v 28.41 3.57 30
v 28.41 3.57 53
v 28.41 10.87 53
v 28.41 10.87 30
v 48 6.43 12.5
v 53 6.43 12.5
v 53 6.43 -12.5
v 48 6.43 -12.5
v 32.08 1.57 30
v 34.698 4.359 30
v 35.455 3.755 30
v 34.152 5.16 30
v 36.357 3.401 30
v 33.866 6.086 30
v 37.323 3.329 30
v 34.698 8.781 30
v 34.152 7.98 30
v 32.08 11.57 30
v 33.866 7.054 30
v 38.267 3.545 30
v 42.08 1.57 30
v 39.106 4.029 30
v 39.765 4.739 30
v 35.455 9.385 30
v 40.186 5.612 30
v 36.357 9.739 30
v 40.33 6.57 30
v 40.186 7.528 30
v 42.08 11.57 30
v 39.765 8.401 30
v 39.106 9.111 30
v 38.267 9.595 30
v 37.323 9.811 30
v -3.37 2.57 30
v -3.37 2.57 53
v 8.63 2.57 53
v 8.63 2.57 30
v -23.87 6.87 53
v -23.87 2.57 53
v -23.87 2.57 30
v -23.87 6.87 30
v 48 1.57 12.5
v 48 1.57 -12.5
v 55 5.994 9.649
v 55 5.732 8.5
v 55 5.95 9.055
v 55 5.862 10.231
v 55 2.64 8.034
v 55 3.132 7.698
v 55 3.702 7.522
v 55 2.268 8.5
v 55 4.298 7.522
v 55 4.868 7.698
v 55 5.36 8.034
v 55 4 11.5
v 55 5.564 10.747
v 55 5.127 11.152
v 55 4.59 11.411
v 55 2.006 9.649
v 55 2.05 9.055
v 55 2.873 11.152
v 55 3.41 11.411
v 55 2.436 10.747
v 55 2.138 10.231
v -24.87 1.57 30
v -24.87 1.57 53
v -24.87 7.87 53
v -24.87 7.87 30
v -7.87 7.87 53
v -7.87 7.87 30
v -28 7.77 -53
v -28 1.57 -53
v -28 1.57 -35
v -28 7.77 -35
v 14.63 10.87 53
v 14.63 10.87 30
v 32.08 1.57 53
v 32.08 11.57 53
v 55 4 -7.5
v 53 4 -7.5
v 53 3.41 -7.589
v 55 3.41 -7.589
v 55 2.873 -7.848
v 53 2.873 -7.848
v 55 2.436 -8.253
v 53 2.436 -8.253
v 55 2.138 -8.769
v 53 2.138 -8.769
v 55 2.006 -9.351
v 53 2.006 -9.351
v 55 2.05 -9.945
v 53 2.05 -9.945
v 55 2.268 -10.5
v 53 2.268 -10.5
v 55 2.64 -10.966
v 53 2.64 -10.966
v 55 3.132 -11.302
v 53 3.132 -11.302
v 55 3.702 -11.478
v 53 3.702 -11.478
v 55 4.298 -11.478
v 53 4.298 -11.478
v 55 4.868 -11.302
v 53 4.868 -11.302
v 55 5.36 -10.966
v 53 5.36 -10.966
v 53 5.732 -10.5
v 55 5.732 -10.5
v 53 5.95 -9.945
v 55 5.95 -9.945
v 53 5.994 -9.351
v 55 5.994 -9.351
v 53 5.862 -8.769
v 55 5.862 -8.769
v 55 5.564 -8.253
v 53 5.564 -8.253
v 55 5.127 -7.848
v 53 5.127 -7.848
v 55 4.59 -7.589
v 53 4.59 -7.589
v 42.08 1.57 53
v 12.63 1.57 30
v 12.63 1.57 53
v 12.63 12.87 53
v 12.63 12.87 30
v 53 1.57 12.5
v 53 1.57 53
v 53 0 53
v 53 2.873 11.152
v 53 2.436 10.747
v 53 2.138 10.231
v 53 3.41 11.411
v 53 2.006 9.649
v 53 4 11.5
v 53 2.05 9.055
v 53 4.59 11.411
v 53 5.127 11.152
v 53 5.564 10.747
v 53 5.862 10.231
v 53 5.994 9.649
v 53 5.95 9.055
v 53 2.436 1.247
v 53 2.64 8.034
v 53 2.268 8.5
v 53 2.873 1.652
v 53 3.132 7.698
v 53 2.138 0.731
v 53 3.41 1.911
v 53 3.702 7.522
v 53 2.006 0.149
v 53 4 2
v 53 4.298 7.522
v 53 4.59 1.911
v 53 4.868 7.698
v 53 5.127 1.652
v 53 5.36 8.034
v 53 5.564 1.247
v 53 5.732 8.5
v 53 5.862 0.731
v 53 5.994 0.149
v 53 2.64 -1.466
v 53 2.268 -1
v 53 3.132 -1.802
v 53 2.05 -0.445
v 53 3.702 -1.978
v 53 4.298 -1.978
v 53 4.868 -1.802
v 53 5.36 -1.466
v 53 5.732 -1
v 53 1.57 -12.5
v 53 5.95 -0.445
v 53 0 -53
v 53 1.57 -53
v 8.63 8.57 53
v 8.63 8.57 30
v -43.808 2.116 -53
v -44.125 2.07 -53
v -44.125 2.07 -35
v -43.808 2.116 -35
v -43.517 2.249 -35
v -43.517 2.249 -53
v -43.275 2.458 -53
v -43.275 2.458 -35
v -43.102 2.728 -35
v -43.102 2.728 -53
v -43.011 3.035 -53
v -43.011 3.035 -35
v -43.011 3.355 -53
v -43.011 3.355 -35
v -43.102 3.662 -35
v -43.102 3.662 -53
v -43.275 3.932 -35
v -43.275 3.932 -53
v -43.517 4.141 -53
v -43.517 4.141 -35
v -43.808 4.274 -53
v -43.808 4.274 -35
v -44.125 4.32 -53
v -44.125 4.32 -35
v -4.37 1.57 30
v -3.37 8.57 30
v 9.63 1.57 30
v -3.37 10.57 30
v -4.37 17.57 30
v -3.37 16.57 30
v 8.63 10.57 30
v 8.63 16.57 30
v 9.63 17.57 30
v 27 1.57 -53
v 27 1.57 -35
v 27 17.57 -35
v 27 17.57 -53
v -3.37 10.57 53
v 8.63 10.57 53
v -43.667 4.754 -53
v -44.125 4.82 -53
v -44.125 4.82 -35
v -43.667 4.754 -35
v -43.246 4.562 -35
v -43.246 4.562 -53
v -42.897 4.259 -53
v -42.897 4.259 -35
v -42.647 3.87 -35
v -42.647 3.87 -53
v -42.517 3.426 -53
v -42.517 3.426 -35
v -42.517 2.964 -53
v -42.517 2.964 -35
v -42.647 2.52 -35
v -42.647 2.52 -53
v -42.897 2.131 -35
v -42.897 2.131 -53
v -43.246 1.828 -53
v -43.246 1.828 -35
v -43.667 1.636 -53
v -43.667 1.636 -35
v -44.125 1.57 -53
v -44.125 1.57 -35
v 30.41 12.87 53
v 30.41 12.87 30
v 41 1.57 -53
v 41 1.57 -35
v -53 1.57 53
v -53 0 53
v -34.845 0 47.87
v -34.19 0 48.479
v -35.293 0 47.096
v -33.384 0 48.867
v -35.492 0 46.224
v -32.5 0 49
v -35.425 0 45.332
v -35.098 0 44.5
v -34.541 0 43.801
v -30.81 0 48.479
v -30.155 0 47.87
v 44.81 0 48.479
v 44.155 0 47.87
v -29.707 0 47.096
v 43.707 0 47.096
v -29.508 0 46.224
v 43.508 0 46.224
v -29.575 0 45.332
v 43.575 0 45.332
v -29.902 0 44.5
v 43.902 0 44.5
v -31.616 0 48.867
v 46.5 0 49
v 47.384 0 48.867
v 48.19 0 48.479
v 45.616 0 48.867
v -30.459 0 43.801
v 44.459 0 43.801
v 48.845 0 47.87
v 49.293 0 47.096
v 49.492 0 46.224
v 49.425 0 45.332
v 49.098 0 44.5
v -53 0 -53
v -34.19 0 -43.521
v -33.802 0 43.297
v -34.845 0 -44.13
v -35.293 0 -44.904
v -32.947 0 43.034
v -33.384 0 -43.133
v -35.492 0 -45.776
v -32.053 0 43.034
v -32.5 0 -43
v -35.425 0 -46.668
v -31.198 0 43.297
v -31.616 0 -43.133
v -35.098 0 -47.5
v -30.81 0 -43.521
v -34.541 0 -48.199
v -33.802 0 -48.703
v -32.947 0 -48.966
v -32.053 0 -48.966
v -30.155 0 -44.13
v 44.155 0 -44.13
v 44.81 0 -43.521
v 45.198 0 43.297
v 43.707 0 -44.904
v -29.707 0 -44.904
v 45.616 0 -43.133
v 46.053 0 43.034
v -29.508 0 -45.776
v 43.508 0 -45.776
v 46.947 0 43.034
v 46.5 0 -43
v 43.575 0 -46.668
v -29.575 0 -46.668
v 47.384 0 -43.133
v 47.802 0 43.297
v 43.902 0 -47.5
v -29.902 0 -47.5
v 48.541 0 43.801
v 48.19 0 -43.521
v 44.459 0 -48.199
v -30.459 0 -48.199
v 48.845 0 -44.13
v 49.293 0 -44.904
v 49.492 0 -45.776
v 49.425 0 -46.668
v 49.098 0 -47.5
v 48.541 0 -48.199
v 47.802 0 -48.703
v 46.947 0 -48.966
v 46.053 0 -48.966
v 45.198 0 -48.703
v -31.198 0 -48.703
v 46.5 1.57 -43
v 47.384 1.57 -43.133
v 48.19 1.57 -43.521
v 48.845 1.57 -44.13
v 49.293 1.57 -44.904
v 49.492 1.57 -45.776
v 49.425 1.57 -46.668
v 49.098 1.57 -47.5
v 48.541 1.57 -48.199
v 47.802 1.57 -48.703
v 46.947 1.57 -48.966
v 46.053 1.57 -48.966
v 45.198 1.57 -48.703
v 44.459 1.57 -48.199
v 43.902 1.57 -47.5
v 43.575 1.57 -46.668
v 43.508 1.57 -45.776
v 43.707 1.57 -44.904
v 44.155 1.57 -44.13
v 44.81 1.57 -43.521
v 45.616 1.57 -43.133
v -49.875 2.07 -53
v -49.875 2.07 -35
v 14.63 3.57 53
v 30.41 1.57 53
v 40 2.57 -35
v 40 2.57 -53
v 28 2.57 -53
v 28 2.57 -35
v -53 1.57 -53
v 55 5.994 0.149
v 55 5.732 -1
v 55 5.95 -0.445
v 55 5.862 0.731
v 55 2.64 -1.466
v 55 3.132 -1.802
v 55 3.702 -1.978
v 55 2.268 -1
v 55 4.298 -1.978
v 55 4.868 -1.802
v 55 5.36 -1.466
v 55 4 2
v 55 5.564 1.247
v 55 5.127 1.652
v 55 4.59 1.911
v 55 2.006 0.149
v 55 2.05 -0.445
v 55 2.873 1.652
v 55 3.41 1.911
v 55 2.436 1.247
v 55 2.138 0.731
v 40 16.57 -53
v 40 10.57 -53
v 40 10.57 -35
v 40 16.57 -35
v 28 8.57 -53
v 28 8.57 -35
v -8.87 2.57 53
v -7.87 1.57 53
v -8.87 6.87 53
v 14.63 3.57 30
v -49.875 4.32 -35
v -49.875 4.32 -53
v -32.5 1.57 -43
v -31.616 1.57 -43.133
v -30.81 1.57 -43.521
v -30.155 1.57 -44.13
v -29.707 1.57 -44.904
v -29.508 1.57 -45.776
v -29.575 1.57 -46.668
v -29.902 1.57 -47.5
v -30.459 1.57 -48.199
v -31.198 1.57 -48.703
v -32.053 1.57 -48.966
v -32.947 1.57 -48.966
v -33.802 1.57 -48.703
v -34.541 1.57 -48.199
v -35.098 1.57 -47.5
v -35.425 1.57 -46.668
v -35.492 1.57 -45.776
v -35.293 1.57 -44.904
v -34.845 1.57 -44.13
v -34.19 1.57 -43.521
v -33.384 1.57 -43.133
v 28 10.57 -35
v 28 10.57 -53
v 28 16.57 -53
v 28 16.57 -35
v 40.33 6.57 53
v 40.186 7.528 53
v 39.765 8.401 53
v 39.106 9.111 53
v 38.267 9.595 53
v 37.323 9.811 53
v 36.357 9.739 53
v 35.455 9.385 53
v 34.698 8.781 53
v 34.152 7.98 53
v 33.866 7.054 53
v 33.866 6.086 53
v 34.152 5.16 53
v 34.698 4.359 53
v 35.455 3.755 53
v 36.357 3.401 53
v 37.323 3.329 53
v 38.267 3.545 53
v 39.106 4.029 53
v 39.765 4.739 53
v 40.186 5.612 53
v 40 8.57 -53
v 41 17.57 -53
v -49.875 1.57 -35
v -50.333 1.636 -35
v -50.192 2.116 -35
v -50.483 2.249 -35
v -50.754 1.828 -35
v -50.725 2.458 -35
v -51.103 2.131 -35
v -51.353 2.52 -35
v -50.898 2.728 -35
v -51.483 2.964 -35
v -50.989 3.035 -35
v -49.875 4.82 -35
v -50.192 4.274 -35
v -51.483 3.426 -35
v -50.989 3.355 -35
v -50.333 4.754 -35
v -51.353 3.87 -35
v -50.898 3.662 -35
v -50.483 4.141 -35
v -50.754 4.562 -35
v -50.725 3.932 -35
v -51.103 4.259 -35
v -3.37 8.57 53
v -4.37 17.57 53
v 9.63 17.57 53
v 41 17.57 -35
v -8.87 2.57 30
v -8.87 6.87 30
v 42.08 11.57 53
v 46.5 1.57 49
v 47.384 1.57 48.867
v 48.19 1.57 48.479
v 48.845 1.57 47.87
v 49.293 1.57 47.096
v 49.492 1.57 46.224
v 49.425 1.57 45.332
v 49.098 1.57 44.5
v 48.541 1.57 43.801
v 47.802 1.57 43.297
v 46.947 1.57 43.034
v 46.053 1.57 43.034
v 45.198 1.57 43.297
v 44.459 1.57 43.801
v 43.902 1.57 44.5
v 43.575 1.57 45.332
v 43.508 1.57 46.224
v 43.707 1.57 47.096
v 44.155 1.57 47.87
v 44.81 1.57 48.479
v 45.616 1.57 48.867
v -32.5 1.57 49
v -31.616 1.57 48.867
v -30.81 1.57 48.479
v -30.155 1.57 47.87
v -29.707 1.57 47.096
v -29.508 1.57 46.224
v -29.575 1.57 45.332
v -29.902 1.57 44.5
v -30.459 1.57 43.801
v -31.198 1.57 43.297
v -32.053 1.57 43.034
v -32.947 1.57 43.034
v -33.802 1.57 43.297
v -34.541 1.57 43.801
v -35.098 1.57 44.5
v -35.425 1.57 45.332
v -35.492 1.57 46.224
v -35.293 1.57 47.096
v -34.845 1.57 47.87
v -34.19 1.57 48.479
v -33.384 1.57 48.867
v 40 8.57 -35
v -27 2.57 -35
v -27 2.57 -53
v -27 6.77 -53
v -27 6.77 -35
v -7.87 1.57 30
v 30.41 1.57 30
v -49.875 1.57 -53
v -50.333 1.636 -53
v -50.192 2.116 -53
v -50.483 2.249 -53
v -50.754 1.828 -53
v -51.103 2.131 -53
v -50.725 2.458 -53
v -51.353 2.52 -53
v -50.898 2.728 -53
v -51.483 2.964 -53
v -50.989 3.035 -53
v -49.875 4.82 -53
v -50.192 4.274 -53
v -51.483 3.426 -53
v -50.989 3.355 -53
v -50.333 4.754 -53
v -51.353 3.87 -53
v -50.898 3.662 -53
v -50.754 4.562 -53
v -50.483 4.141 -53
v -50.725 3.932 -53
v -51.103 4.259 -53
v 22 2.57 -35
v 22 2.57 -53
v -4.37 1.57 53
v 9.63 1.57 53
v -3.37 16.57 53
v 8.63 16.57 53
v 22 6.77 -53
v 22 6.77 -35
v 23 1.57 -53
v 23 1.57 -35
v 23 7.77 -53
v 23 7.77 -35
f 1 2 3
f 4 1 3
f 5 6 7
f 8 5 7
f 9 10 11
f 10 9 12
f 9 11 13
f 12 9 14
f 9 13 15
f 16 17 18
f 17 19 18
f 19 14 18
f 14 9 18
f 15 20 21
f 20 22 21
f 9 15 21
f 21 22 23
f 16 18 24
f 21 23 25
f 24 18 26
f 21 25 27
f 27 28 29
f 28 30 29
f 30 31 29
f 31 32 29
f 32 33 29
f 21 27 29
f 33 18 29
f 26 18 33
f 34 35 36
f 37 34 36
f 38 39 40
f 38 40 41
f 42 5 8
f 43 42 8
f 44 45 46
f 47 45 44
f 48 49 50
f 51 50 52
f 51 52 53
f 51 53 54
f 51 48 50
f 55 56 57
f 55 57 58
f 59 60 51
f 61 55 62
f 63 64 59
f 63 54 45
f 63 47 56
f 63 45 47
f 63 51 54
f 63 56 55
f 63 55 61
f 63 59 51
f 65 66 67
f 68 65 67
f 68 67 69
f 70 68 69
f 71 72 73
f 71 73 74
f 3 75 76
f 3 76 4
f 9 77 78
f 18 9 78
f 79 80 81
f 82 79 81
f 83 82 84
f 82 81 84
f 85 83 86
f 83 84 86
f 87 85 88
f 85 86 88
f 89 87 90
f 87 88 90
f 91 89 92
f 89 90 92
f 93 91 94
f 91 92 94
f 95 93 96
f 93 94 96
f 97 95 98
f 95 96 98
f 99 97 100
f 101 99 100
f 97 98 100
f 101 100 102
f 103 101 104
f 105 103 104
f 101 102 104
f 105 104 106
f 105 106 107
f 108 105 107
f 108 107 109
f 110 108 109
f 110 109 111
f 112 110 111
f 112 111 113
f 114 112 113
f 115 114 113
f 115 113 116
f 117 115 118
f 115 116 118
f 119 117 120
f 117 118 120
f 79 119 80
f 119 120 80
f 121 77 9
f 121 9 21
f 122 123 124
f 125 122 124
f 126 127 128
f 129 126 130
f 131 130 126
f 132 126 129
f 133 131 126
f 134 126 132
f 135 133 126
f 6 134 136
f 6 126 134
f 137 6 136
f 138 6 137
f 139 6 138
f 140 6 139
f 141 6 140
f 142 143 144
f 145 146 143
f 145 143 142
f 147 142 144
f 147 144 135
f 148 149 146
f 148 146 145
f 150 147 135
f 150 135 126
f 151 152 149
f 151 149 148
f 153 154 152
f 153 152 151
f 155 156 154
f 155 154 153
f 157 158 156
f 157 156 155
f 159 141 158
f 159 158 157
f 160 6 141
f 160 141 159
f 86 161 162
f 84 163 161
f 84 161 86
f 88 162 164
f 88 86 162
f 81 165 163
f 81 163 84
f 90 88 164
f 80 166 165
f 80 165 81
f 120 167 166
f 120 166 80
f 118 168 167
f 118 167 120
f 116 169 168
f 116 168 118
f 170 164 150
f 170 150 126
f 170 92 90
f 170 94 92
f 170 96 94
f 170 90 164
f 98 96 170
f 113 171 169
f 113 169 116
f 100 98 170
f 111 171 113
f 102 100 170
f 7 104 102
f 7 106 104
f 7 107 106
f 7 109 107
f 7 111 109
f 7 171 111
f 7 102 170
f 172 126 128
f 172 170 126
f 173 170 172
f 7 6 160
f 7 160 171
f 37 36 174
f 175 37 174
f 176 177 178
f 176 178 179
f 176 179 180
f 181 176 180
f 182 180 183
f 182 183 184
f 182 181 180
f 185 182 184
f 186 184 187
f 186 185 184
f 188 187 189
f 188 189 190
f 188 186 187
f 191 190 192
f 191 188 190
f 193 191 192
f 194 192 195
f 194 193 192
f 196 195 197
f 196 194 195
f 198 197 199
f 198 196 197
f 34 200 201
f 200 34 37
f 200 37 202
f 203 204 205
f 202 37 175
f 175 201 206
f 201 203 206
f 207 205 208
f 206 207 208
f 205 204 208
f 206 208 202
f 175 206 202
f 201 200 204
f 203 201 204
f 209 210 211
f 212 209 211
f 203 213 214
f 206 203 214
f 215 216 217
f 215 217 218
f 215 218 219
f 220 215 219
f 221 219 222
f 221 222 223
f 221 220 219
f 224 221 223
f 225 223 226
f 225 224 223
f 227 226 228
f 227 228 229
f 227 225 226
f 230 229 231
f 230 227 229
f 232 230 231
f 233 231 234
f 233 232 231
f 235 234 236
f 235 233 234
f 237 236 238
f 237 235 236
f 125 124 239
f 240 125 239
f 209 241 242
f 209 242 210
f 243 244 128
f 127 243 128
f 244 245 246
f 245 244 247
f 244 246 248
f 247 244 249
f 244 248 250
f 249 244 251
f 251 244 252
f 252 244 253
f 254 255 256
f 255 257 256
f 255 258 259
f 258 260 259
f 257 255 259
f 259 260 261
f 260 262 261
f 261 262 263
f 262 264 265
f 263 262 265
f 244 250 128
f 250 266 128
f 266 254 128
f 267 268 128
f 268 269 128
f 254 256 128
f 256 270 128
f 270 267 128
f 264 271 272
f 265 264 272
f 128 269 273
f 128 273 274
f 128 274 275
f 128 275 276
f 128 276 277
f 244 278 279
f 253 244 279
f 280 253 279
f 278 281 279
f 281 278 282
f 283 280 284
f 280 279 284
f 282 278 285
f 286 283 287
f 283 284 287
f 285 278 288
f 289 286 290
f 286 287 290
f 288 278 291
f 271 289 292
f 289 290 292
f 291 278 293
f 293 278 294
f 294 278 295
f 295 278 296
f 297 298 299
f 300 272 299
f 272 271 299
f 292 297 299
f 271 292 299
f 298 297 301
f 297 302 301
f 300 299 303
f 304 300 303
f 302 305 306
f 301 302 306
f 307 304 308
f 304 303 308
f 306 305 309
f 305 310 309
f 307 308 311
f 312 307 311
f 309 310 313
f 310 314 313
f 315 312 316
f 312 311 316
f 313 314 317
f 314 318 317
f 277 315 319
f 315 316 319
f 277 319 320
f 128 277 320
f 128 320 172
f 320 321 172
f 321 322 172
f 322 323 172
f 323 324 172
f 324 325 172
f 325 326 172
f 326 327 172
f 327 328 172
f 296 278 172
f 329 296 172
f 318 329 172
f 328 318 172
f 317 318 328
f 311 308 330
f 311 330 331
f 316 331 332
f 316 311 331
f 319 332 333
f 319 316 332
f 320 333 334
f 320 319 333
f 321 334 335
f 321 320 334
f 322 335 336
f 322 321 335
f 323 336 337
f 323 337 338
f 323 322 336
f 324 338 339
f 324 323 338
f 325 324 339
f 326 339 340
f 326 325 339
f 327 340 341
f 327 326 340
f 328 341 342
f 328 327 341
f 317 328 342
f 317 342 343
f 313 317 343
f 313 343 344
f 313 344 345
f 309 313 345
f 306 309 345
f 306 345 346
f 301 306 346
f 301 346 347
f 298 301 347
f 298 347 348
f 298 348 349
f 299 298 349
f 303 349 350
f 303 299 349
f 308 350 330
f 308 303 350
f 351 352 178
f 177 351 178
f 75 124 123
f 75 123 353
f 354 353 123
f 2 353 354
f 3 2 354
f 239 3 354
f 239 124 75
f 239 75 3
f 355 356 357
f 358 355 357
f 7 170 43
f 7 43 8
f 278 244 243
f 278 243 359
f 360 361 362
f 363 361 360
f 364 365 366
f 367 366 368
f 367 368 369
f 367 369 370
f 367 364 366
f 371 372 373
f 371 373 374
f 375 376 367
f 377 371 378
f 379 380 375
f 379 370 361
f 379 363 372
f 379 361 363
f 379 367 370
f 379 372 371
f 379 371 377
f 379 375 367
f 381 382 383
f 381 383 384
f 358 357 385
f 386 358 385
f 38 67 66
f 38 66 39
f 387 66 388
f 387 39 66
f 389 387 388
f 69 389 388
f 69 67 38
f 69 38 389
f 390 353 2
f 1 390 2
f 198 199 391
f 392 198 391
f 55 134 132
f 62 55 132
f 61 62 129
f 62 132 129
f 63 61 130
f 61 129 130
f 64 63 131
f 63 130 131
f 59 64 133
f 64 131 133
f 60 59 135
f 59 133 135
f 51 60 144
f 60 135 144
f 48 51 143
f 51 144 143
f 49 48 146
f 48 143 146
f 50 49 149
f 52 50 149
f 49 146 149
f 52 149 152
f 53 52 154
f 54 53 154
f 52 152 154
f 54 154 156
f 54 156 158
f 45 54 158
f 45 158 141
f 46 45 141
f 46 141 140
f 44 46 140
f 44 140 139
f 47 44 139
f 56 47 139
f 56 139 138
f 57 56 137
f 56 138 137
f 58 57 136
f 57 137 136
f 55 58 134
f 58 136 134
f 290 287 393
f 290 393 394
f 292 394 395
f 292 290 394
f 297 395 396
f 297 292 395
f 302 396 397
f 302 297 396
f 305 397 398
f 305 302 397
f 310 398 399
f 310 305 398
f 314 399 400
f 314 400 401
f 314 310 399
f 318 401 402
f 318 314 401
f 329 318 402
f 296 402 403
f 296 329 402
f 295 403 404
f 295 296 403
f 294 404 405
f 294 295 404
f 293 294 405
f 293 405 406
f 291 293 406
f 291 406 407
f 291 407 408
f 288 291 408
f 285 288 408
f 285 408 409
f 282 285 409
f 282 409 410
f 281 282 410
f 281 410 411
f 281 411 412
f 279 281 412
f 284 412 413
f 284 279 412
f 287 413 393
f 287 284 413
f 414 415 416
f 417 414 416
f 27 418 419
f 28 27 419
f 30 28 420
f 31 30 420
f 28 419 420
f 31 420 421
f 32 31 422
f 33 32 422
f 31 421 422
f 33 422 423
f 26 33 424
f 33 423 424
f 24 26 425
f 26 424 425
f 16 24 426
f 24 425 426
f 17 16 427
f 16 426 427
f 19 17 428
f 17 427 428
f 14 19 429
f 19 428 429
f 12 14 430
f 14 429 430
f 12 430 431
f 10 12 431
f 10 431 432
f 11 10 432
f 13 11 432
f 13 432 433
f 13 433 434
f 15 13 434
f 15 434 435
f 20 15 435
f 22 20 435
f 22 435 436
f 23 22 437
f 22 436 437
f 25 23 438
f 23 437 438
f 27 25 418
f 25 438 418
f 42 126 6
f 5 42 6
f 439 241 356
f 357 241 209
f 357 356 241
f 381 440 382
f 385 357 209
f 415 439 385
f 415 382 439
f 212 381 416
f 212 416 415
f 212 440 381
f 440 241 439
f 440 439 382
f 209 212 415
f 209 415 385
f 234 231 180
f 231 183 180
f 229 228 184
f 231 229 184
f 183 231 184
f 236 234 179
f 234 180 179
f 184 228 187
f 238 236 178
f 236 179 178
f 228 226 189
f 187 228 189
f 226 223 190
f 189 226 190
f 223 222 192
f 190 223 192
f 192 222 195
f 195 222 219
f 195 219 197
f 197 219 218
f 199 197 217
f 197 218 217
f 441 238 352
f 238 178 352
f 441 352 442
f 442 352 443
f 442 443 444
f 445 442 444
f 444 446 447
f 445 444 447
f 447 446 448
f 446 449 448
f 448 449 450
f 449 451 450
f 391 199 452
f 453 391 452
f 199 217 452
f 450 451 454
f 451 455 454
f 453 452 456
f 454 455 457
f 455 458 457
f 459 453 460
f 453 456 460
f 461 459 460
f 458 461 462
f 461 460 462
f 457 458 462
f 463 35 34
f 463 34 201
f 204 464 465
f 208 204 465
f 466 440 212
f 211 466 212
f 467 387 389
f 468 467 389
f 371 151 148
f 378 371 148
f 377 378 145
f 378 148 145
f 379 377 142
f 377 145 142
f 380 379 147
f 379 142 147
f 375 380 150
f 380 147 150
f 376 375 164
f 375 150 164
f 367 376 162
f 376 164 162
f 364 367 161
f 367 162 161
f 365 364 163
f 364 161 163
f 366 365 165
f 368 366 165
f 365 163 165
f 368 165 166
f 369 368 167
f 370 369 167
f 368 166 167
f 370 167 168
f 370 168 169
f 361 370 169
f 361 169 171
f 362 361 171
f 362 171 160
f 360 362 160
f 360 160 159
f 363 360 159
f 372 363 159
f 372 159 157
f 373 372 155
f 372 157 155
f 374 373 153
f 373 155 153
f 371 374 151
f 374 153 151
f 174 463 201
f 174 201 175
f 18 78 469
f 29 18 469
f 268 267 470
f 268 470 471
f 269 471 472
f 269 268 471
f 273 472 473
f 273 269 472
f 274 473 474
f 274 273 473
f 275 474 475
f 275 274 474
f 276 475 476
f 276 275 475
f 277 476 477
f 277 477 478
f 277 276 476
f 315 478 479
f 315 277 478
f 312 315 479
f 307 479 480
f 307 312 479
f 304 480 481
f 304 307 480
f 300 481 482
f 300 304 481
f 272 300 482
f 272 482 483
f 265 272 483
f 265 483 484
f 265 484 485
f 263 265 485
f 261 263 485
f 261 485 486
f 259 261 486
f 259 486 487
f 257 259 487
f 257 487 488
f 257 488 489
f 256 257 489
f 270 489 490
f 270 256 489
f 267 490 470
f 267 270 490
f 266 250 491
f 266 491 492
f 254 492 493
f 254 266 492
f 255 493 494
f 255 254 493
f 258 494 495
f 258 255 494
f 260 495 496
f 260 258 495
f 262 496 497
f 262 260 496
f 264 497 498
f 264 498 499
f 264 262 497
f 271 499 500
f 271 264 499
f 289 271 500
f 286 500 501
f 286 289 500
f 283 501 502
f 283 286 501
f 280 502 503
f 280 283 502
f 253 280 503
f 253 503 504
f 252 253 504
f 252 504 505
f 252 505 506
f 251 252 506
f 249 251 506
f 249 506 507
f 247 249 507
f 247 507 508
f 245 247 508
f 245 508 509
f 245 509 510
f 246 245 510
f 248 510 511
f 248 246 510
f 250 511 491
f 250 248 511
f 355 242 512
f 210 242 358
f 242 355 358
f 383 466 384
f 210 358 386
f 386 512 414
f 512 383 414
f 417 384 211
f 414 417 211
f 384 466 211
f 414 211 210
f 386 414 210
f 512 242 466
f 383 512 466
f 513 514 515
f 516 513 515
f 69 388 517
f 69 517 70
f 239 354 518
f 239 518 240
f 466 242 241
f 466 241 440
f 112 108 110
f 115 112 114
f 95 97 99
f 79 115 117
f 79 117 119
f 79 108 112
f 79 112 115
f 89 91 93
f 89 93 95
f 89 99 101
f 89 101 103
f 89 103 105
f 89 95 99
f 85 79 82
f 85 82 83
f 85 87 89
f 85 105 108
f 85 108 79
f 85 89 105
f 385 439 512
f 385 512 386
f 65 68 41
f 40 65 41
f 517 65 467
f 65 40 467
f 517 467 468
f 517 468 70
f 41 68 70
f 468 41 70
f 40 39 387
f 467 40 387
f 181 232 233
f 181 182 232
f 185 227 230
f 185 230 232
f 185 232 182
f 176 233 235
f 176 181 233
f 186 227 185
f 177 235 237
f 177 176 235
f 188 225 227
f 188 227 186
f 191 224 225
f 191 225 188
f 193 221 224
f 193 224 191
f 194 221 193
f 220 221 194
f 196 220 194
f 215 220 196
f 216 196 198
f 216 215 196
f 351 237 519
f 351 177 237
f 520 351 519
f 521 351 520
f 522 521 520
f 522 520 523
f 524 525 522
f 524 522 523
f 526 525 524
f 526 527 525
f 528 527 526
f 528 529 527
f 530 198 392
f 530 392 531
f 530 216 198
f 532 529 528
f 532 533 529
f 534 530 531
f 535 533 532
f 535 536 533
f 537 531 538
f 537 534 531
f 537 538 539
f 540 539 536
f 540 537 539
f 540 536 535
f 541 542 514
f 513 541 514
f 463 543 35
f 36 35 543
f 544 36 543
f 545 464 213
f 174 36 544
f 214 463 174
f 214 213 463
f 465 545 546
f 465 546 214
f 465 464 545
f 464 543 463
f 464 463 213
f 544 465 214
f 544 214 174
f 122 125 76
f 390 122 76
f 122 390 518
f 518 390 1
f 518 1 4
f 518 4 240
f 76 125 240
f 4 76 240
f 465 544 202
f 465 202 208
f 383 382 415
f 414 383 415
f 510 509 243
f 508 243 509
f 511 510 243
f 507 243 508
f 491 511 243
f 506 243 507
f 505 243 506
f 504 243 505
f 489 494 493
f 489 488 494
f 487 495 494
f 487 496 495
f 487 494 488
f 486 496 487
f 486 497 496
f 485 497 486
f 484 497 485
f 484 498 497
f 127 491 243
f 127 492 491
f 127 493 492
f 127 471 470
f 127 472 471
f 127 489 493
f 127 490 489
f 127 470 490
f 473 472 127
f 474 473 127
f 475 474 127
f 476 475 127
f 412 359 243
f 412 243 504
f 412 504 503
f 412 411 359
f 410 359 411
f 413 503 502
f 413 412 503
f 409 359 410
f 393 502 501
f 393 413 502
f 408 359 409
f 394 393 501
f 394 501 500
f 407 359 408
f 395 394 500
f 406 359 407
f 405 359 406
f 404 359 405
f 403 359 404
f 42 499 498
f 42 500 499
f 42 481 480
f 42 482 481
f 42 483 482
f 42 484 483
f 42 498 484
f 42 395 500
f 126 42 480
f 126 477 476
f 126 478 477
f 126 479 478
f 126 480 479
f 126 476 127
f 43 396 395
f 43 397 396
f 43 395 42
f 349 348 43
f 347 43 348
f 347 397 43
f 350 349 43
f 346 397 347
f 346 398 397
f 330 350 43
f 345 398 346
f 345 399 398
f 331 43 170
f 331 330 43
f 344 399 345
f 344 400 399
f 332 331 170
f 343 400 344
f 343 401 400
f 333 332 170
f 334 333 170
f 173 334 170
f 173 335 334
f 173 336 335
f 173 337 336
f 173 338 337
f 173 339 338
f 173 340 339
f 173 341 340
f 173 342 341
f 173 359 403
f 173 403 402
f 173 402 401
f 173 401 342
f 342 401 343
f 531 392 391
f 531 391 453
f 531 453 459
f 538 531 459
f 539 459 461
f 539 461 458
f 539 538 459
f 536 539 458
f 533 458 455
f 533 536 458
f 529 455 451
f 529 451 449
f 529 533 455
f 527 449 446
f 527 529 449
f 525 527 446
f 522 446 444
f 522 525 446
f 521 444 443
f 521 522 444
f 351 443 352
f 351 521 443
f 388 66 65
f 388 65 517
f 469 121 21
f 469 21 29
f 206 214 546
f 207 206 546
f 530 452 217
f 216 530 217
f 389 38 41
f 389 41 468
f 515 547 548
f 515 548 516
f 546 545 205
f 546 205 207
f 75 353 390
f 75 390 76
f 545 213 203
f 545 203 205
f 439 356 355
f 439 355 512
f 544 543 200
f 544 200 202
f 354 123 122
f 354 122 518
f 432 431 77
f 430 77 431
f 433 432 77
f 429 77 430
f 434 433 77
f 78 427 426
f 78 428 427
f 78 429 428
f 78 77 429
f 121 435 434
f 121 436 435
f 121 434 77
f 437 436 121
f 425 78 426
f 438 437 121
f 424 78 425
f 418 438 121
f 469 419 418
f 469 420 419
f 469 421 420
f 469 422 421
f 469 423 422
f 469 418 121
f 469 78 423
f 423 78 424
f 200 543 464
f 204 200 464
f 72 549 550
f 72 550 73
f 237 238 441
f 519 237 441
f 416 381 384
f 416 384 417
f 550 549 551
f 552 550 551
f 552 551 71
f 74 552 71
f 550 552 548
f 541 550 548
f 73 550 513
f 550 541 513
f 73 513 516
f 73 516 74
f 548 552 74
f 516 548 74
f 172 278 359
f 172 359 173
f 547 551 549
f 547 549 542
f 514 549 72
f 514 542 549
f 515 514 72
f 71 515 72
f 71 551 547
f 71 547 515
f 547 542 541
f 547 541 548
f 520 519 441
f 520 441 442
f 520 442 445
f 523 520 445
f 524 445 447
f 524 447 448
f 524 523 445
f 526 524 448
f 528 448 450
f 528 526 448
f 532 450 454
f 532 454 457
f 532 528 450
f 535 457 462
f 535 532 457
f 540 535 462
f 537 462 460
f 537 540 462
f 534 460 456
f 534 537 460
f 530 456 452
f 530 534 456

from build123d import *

# Parameters (mm, degrees)
SKETCH1_W             = 106
SKETCH1_H             = 106
SKETCH1_R             = 3
BOSS_EXTRUDE1_DEPTH   = 1.57
SKETCH2_W             = 17
SKETCH2_H             = 6.3
SKETCH2_W_2           = 15
SKETCH2_H_2           = 4.3
BOSS_EXTRUDE2_DEPTH   = 23
SKETCH2_W_3           = 10
SKETCH2_H_3           = 10
SKETCH2_R             = 3.25
BOSS_EXTRUDE2_2_DEPTH = 23
SKETCH2_W_4           = 17.78
SKETCH2_H_4           = 11.3
SKETCH2_W_5           = 13.78
SKETCH2_H_5           = 7.3
BOSS_EXTRUDE2_3_DEPTH = 23
SKETCH2_W_6           = 14
SKETCH2_H_6           = 16
SKETCH2_W_7           = 12
SKETCH2_H_7           = 6
BOSS_EXTRUDE2_4_DEPTH = 23
SKETCH3_W             = 14
SKETCH3_H             = 16
SKETCH3_W_2           = 12
SKETCH3_H_2           = 6
BOSS_EXTRUDE3_DEPTH   = 18
BOSS_EXTRUDE3_2_DEPTH = 18
SKETCH3_W_3           = 51
SKETCH3_H_3           = 6.2
SKETCH3_W_4           = 49
SKETCH3_H_4           = 4.2
BOSS_EXTRUDE3_3_DEPTH = 18
SKETCH4_W             = 25
SKETCH4_H             = 4.86
BOSS_EXTRUDE4_DEPTH   = 5
SKETCH4_3_R           = 2
BOSS_EXTRUDE5_DEPTH   = 2


with BuildPart() as part:
    # Sketch1 → Boss-Extrude1 (new body)
    with BuildSketch(Plane(origin=(0, 0, 0), x_dir=(1, 0, 0), z_dir=(0, 1, 0))):
        Rectangle(SKETCH1_W, SKETCH1_H)
        with Locations((46.5, -46)):
            Circle(SKETCH1_R, mode=Mode.SUBTRACT)
        with Locations((-32.5, -46)):
            Circle(SKETCH1_R, mode=Mode.SUBTRACT)
        with Locations((-32.5, 46)):
            Circle(SKETCH1_R, mode=Mode.SUBTRACT)
        with Locations((46.5, 46)):
            Circle(SKETCH1_R, mode=Mode.SUBTRACT)
    extrude(amount=BOSS_EXTRUDE1_DEPTH)

    # Sketch4 → Boss-Extrude4 (add)
    with BuildSketch(Plane(origin=(53, 0, 0), x_dir=(0, 0, -1), z_dir=(1, 0, 0))):
        with Locations((0, 4)):
            Rectangle(SKETCH4_W, SKETCH4_H)
    extrude(amount=-BOSS_EXTRUDE4_DEPTH)

    # Sketch4<3> → Boss-Extrude5 (add)
    with BuildSketch(Plane(origin=(53, 0, 0), x_dir=(0, 0, -1), z_dir=(1, 0, 0))):
        with Locations((-9.5, 4)):
            Circle(SKETCH4_3_R)
        with Locations((0, 4)):
            Circle(SKETCH4_3_R)
        with Locations((9.5, 4)):
            Circle(SKETCH4_3_R)
    extrude(amount=BOSS_EXTRUDE5_DEPTH)


with BuildPart() as body_2:
    # Sketch2 → Boss-Extrude2 (new body)
    with BuildSketch(Plane.XY.offset(53)):
        with Locations((-16.37, 4.72)):
            Rectangle(SKETCH2_W, SKETCH2_H)
        with Locations((-16.37, 4.72)):
            Rectangle(SKETCH2_W_2, SKETCH2_H_2, mode=Mode.SUBTRACT)
    extrude(amount=-BOSS_EXTRUDE2_DEPTH)


with BuildPart() as body_3:
    # Sketch2 → Boss-Extrude2 2 (new body)
    with BuildSketch(Plane.XY.offset(53)):
        with Locations((37.08, 6.57)):
            Rectangle(SKETCH2_W_3, SKETCH2_H_3)
        with Locations((37.08, 6.57)):
            Circle(SKETCH2_R, mode=Mode.SUBTRACT)
    extrude(amount=-BOSS_EXTRUDE2_2_DEPTH)


with BuildPart() as body_4:
    # Sketch2 → Boss-Extrude2 3 (new body)
    with BuildSketch(Plane.XY.offset(53)):
        with Locations((21.52, 7.22)):
            Rectangle(SKETCH2_W_4, SKETCH2_H_4)
        with Locations((21.52, 7.22)):
            Rectangle(SKETCH2_W_5, SKETCH2_H_5, mode=Mode.SUBTRACT)
    extrude(amount=-BOSS_EXTRUDE2_3_DEPTH)


with BuildPart() as body_5:
    # Sketch2 → Boss-Extrude2 4 (new body)
    with BuildSketch(Plane.XY.offset(53)):
        with Locations((2.63, 9.57)):
            Rectangle(SKETCH2_W_6, SKETCH2_H_6)
        with Locations((2.63, 5.57)):
            Rectangle(SKETCH2_W_7, SKETCH2_H_7, mode=Mode.SUBTRACT)
        with Locations((2.63, 13.57)):
            Rectangle(SKETCH2_W_7, SKETCH2_H_7, mode=Mode.SUBTRACT)
    extrude(amount=-BOSS_EXTRUDE2_4_DEPTH)


with BuildPart() as body_6:
    # Sketch3 → Boss-Extrude3 (new body)
    with BuildSketch(Plane(origin=(0, 0, -53), x_dir=(-1, 0, 0), z_dir=(0, 0, -1))):
        with Locations((-34, 9.57)):
            Rectangle(SKETCH3_W, SKETCH3_H)
        with Locations((-34, 5.57)):
            Rectangle(SKETCH3_W_2, SKETCH3_H_2, mode=Mode.SUBTRACT)
        with Locations((-34, 13.57)):
            Rectangle(SKETCH3_W_2, SKETCH3_H_2, mode=Mode.SUBTRACT)
    extrude(amount=-BOSS_EXTRUDE3_DEPTH)


with BuildPart() as body_7:
    # Sketch3 → Boss-Extrude3 2 (new body)
    with BuildSketch(Plane(origin=(0, 0, -53), x_dir=(-1, 0, 0), z_dir=(0, 0, -1))):
        with BuildLine():
            ThreePointArc((44.125, 4.82), (42.5, 3.195), (44.125, 1.57))
            Line((44.125, 1.57), (49.875, 1.57))
            ThreePointArc((49.875, 1.57), (51.5, 3.195), (49.875, 4.82))
            Line((49.875, 4.82), (44.125, 4.82))
        make_face()
        with BuildLine():
            ThreePointArc((44.125, 2.07), (43, 3.195), (44.125, 4.32))
            Line((44.125, 4.32), (49.875, 4.32))
            ThreePointArc((49.875, 4.32), (51, 3.195), (49.875, 2.07))
            Line((49.875, 2.07), (44.125, 2.07))
        make_face(mode=Mode.SUBTRACT)
    extrude(amount=-BOSS_EXTRUDE3_2_DEPTH)


with BuildPart() as body_8:
    # Sketch3 → Boss-Extrude3 3 (new body)
    with BuildSketch(Plane(origin=(0, 0, -53), x_dir=(-1, 0, 0), z_dir=(0, 0, -1))):
        with Locations((2.5, 4.67)):
            Rectangle(SKETCH3_W_3, SKETCH3_H_3)
        with Locations((2.5, 4.67)):
            Rectangle(SKETCH3_W_4, SKETCH3_H_4, mode=Mode.SUBTRACT)
    extrude(amount=-BOSS_EXTRUDE3_3_DEPTH)


solid = Compound([part.part, body_2.part, body_3.part, body_4.part, body_5.part, body_6.part, body_7.part, body_8.part])
